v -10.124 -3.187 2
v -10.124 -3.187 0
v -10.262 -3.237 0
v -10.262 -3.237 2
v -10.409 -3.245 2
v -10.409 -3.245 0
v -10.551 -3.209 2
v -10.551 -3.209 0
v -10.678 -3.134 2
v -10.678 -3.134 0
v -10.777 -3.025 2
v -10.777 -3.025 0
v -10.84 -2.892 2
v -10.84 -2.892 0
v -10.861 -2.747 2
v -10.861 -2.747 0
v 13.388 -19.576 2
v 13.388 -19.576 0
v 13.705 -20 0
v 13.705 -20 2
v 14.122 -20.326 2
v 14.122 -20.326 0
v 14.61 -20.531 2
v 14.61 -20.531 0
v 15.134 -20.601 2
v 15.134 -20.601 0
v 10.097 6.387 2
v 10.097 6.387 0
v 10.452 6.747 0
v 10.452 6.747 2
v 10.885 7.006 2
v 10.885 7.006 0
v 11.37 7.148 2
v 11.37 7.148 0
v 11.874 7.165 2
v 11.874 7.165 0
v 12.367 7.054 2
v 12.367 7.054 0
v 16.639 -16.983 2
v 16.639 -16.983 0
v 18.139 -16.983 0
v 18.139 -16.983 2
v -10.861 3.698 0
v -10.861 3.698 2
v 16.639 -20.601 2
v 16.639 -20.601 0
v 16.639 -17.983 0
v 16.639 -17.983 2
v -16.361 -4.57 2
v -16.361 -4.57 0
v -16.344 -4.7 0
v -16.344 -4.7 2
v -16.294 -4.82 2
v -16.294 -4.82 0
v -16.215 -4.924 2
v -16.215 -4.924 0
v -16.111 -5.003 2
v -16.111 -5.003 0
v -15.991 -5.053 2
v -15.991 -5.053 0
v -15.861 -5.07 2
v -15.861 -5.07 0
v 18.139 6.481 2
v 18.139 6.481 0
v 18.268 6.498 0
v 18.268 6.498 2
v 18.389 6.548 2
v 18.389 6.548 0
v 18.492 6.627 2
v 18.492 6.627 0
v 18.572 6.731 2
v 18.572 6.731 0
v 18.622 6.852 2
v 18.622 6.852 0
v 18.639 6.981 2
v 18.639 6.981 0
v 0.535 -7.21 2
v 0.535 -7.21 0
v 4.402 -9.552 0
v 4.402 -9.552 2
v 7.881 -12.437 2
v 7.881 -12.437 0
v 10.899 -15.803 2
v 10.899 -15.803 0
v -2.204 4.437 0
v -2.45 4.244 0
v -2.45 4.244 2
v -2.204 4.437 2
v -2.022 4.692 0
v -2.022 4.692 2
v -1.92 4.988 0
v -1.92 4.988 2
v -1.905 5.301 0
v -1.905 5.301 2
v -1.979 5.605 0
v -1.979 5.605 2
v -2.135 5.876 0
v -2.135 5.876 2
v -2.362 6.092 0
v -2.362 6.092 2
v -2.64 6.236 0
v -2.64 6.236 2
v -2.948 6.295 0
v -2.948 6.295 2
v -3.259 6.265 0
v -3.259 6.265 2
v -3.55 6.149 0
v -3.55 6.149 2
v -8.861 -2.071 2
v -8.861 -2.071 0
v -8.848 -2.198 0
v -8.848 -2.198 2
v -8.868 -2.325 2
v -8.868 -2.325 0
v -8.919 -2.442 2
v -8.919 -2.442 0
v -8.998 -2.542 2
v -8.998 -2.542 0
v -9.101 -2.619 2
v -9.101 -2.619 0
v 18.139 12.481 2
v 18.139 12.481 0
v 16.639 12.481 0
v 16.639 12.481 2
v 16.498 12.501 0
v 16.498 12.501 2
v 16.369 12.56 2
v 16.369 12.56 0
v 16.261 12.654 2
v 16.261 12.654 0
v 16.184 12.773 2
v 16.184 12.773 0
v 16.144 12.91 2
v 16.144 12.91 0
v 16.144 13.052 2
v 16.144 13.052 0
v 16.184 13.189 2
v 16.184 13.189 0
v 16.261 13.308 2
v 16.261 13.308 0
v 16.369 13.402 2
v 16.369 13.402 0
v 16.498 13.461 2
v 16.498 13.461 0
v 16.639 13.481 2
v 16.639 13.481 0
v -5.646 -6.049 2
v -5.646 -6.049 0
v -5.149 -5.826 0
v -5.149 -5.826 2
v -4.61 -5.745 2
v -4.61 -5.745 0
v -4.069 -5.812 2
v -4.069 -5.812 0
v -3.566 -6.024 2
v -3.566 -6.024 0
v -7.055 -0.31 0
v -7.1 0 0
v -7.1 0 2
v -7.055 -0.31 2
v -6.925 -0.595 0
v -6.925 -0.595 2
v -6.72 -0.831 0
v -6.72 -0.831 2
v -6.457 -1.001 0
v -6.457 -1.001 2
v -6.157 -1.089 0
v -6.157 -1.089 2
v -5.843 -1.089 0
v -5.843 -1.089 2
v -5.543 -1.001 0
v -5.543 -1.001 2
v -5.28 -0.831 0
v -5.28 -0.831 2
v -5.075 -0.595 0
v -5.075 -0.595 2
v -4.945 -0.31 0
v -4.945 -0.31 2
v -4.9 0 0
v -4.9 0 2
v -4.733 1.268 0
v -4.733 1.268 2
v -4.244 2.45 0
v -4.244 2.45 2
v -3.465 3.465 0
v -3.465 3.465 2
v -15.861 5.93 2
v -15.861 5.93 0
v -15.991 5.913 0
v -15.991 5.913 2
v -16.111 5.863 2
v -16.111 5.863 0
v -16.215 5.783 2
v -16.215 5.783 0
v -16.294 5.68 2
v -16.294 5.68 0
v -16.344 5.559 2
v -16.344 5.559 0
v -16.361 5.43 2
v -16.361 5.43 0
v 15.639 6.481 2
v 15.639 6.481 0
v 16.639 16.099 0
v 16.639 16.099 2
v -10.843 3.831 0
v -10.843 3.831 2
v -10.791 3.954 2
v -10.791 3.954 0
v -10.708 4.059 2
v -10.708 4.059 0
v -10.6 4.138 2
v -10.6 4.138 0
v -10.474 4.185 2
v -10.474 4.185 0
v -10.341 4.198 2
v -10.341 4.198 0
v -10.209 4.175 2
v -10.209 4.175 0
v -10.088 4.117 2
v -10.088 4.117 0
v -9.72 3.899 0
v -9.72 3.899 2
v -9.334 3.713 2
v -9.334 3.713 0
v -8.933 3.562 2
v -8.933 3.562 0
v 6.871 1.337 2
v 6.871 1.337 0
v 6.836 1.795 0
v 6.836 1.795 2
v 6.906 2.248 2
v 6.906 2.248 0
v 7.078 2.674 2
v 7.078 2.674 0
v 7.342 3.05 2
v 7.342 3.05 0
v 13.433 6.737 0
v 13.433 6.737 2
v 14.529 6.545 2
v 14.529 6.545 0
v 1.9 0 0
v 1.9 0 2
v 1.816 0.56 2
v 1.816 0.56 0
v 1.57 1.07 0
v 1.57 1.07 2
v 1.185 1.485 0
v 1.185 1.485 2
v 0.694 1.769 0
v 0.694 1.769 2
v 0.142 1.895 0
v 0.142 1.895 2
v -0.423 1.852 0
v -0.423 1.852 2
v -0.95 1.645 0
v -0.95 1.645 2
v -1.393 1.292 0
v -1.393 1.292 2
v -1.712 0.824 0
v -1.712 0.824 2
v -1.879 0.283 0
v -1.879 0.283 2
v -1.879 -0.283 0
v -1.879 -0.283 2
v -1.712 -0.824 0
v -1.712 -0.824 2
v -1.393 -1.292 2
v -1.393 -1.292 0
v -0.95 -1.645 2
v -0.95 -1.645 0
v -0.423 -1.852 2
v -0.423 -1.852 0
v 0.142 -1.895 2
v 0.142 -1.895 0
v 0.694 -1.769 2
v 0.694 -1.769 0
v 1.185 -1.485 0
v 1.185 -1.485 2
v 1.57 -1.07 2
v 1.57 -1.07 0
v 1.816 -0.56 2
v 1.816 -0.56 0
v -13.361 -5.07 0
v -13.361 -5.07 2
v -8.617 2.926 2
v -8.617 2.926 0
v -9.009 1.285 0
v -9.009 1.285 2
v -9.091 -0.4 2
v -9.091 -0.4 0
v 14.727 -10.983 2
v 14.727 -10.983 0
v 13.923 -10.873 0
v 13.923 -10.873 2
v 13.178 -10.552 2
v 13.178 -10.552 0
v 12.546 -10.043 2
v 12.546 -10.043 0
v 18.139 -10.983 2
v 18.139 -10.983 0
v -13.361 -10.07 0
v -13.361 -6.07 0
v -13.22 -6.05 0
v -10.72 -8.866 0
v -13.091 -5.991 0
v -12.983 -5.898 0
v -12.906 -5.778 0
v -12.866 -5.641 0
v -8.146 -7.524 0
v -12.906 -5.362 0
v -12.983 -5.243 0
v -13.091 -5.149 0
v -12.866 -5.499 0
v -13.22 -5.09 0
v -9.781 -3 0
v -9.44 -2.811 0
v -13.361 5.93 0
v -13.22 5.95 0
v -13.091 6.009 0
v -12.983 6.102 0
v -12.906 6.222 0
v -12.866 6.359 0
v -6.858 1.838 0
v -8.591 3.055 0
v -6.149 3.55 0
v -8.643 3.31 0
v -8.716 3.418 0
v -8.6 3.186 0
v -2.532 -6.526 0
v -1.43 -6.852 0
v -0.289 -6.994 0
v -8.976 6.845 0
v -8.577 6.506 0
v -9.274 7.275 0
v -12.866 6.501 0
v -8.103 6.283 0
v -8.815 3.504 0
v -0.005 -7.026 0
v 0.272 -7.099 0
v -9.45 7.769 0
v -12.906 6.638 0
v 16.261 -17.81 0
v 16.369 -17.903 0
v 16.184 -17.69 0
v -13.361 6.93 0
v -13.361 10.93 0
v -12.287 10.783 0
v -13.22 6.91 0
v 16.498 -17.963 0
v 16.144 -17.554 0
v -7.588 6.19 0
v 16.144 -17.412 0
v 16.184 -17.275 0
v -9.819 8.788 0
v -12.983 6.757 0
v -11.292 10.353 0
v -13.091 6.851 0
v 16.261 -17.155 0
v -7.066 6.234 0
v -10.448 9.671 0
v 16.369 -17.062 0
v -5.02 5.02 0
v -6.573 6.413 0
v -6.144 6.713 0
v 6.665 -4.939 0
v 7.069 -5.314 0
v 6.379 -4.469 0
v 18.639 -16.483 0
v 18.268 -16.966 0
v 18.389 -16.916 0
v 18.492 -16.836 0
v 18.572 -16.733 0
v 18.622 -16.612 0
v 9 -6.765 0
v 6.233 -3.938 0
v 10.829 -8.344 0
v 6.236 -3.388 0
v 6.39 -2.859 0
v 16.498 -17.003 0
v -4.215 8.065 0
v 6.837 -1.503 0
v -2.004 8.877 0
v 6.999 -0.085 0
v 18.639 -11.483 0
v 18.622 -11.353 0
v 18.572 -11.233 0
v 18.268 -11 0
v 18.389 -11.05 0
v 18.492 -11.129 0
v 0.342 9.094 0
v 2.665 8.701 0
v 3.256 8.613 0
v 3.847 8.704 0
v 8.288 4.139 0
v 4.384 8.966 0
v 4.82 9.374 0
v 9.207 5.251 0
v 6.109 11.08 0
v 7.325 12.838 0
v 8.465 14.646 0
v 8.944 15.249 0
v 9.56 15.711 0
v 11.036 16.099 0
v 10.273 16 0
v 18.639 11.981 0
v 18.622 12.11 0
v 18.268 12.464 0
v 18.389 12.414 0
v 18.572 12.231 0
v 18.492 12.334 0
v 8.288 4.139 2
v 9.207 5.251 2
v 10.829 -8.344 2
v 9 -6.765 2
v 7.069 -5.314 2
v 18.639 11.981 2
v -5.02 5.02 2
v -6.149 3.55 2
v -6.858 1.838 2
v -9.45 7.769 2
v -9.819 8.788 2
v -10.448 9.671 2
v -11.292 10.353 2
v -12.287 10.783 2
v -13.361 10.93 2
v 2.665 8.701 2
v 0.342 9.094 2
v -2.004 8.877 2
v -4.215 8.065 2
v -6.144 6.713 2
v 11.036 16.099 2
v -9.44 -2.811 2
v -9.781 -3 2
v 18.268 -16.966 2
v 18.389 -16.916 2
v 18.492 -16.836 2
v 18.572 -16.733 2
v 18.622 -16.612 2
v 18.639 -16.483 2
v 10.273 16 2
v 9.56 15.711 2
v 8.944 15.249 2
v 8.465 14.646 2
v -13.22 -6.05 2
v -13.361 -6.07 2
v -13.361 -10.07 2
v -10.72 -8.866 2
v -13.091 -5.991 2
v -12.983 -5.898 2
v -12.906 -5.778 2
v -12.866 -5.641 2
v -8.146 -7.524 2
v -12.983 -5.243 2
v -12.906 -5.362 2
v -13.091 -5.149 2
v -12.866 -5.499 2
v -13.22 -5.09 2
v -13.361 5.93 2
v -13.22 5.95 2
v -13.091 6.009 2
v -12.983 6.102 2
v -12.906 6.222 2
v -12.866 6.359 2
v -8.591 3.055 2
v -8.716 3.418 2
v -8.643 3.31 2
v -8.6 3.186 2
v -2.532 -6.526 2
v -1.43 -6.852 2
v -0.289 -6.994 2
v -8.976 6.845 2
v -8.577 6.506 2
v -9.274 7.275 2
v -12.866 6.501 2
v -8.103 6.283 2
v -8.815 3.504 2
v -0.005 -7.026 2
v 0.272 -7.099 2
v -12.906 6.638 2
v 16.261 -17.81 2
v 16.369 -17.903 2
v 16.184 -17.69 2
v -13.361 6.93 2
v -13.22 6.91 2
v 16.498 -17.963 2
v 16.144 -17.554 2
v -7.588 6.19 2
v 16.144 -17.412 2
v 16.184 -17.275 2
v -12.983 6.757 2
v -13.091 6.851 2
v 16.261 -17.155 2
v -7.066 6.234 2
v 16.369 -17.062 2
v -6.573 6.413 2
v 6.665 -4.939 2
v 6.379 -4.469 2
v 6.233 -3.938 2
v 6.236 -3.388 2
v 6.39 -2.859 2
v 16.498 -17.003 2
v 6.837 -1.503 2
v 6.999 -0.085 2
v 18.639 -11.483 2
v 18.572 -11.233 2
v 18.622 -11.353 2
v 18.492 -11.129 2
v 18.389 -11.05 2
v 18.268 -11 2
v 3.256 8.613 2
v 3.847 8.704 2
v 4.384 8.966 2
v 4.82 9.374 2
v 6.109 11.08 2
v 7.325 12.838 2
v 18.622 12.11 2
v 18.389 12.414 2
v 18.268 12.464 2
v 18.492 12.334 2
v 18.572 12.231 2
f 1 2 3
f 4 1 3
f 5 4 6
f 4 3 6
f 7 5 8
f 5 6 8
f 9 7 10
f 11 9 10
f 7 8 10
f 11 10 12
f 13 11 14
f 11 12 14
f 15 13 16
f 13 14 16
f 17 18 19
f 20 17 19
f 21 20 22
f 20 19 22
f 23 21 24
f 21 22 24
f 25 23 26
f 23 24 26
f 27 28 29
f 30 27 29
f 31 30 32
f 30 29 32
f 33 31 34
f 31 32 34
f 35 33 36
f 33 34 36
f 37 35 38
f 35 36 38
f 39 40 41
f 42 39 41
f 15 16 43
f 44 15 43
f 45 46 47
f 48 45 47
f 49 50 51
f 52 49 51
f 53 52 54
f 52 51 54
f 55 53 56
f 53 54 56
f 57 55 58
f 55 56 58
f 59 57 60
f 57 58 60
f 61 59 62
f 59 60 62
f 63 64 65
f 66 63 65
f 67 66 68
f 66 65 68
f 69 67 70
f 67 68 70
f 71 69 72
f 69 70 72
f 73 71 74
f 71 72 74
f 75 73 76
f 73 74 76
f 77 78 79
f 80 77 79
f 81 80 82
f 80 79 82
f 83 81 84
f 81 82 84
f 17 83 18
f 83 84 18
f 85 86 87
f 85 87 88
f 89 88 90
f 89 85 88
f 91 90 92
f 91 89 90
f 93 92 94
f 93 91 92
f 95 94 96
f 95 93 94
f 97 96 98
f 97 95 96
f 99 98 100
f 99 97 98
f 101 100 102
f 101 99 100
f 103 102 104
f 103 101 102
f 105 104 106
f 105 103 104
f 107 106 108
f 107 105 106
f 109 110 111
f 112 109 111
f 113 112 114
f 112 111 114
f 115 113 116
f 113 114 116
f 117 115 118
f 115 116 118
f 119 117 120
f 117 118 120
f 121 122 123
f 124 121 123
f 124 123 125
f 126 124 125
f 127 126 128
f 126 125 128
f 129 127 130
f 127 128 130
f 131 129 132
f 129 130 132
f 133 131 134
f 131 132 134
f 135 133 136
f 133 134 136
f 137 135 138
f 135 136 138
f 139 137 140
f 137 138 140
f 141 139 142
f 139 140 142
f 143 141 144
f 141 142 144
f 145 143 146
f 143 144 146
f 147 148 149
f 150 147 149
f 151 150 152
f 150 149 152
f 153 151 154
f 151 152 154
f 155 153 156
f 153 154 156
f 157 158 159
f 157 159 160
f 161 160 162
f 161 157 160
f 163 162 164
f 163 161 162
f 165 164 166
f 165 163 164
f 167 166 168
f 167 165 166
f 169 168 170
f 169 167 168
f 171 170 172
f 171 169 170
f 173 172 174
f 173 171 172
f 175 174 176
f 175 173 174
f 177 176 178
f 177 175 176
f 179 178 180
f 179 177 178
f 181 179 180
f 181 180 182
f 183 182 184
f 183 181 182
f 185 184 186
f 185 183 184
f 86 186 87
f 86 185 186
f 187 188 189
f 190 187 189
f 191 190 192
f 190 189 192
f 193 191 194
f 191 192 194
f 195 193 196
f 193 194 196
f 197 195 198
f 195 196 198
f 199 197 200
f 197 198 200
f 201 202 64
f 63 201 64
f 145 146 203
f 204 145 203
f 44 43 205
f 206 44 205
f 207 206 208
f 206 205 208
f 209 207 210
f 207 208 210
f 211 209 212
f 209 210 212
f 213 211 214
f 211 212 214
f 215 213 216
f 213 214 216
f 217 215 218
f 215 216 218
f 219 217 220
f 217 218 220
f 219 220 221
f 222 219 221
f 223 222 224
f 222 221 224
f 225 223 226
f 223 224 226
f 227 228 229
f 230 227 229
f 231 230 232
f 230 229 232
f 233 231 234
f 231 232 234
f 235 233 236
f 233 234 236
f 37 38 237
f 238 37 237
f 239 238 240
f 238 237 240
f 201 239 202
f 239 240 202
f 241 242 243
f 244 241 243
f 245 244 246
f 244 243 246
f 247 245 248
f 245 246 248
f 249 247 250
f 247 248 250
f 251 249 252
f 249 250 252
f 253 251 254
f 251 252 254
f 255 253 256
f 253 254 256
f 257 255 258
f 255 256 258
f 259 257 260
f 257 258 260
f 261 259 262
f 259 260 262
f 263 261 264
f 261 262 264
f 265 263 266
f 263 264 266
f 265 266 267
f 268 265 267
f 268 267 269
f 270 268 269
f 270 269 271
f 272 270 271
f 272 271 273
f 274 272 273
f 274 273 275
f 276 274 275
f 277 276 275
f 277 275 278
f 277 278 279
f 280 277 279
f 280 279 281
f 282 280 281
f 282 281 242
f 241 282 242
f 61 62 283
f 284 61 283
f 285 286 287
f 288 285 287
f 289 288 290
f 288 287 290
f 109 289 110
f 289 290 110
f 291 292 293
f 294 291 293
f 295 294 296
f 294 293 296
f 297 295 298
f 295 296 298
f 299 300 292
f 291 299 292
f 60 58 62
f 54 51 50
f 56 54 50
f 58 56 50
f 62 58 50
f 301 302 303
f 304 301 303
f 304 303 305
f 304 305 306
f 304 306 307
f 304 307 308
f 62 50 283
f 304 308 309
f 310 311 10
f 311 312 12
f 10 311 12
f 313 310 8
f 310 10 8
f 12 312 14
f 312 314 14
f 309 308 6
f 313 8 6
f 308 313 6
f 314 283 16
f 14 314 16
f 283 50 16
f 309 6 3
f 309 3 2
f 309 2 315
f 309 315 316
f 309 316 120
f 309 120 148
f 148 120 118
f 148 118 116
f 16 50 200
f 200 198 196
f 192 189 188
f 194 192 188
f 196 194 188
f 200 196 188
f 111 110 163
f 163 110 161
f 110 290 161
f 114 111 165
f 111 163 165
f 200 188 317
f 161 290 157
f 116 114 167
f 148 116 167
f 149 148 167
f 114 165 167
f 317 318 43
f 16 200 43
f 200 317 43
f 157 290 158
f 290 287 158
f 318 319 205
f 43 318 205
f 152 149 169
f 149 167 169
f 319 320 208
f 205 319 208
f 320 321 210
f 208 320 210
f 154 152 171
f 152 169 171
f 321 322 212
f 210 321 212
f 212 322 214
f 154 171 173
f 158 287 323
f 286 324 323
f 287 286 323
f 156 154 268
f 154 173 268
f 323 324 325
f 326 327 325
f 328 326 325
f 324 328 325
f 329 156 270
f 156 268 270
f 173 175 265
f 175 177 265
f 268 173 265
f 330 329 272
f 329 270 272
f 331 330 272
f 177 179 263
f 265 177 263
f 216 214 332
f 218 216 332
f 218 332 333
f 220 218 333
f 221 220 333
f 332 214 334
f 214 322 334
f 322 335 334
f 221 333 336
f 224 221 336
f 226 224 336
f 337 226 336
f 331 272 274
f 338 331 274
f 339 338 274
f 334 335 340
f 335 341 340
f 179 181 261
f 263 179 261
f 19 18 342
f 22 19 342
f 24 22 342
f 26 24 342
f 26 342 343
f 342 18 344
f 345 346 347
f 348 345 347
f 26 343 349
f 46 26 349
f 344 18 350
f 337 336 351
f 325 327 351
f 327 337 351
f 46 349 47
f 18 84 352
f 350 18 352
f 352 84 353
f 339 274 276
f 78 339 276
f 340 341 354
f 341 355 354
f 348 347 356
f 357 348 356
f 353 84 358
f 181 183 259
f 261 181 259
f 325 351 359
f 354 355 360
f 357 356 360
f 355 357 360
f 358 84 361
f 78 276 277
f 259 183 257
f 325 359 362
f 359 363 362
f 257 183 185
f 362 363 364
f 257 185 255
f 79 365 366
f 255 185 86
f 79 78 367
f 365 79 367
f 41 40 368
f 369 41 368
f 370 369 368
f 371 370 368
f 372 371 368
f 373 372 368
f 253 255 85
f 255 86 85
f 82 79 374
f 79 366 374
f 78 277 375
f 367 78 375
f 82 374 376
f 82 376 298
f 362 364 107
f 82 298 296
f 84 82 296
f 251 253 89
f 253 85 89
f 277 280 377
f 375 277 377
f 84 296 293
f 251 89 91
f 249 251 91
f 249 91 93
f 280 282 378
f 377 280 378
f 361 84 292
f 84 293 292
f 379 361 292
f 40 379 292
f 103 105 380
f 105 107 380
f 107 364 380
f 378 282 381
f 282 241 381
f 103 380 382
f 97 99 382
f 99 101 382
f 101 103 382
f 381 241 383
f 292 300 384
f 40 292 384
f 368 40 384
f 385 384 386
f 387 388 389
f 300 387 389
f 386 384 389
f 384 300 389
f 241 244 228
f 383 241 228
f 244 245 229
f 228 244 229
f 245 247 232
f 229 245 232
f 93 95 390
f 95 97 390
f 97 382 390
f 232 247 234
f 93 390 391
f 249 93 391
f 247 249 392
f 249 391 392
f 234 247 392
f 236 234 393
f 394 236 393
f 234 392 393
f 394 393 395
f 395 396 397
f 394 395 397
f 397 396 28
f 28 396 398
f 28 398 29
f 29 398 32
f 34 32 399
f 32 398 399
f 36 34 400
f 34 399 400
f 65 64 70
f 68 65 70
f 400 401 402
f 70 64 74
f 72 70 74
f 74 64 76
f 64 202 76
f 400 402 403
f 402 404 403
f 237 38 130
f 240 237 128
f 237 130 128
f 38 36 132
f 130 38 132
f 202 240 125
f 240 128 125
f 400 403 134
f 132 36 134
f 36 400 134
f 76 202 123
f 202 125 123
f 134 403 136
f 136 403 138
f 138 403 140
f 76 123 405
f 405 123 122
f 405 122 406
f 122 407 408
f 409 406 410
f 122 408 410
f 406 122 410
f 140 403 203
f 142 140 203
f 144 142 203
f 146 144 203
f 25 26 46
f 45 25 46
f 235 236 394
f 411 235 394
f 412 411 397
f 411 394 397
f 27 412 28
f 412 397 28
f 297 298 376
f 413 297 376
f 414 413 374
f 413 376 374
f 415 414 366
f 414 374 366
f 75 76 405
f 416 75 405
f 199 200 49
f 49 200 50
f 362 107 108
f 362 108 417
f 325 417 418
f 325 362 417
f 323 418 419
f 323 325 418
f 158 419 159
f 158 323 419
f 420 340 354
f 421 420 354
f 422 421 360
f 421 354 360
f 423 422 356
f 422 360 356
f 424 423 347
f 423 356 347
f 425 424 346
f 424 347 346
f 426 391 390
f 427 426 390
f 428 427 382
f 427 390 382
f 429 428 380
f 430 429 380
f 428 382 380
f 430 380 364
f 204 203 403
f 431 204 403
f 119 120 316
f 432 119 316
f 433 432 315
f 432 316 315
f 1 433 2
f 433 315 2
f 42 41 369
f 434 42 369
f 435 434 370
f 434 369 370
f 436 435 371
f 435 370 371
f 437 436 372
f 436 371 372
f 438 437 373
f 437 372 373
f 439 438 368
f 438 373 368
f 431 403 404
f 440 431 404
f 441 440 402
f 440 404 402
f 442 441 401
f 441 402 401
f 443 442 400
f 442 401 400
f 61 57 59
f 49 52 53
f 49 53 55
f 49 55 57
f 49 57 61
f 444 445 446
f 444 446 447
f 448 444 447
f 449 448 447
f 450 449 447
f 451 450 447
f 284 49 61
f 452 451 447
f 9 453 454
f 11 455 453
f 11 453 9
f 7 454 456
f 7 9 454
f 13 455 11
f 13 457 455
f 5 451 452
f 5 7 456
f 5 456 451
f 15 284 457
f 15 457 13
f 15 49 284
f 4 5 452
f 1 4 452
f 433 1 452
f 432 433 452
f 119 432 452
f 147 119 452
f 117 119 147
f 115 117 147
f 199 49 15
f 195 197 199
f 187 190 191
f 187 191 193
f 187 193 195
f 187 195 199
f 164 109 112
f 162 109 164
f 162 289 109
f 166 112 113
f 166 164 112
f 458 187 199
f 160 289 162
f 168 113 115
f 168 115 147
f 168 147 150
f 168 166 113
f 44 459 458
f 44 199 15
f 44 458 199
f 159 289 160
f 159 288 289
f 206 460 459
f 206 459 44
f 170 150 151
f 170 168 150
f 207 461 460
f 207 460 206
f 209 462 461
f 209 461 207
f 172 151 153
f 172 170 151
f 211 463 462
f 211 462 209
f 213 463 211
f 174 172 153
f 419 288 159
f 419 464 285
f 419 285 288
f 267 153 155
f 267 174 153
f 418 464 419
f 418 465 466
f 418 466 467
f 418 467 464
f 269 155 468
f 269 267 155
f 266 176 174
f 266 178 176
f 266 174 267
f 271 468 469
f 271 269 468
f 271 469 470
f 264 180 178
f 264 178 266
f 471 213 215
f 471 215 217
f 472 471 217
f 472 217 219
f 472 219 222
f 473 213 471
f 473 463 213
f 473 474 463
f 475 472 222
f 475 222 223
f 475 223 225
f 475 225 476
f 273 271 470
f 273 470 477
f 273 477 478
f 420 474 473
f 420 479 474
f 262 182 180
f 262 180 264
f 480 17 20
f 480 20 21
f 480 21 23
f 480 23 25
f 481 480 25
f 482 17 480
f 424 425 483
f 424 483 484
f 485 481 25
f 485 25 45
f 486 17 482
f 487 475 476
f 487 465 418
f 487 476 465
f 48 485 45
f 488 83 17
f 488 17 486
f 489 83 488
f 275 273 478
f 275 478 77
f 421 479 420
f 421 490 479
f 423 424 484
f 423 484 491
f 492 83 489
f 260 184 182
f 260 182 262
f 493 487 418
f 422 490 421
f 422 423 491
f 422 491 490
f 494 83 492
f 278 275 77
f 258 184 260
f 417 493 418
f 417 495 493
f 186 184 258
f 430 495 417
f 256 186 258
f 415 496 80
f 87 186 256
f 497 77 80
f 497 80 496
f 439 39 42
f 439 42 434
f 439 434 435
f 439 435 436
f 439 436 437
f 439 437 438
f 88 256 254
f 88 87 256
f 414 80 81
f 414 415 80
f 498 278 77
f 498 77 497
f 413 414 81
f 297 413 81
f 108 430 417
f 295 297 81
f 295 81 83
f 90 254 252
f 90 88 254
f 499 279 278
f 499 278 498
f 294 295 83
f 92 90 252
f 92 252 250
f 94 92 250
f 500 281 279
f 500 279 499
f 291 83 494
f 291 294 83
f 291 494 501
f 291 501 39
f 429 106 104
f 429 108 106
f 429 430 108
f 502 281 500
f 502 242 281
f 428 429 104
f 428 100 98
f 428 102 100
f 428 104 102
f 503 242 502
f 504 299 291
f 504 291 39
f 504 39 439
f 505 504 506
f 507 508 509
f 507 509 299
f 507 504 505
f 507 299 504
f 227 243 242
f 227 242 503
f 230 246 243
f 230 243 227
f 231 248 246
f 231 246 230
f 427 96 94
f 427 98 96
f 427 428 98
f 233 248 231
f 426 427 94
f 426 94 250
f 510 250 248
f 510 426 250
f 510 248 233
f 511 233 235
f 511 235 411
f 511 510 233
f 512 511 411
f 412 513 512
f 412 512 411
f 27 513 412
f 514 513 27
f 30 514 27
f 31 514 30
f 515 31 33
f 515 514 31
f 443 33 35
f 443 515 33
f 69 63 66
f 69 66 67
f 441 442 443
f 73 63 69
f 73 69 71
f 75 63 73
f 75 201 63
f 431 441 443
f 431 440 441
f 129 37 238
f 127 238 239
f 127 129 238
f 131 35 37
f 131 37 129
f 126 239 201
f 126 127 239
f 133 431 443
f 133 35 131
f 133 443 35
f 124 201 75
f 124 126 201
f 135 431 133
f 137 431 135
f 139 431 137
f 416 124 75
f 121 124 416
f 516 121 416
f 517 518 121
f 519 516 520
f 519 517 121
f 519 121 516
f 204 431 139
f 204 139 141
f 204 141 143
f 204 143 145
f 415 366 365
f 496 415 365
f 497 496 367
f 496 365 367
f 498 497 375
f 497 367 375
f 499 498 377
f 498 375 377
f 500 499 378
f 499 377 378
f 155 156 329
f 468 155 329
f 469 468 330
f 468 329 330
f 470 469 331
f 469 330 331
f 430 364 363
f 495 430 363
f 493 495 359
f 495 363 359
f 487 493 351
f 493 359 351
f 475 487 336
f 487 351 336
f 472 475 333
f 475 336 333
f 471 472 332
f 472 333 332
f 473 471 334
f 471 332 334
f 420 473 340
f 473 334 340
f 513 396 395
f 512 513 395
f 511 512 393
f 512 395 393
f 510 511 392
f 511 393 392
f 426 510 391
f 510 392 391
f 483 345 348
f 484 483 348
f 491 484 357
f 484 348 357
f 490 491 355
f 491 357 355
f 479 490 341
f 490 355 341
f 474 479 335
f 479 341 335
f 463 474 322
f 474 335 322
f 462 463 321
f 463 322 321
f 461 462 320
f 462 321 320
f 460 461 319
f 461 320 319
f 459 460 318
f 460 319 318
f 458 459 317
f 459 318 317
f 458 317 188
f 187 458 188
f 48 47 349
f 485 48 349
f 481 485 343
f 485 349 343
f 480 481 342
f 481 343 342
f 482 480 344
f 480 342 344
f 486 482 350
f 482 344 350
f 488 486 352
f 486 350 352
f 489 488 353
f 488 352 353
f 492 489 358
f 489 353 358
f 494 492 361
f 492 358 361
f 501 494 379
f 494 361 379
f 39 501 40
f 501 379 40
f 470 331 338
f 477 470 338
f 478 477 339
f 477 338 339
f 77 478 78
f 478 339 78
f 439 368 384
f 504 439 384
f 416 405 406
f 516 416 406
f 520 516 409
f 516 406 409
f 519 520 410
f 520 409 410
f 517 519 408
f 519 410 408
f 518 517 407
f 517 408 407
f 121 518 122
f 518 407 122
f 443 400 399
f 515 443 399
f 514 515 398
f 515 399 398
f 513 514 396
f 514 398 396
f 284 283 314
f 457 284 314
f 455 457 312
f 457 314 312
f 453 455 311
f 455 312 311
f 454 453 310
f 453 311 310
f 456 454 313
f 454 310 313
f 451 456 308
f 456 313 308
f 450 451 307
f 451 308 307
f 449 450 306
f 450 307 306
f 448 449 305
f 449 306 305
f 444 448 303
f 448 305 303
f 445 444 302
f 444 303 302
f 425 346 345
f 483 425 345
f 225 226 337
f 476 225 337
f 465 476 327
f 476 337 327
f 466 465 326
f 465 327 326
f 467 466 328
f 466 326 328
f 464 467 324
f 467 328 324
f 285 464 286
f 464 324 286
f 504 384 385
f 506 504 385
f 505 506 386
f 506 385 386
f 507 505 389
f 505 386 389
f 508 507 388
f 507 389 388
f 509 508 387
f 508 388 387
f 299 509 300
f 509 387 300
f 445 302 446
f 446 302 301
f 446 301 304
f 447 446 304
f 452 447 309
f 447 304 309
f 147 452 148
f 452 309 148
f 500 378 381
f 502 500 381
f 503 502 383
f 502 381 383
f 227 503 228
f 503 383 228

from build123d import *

# Parameters (mm, degrees)
BOSS_EXTRUDE1_DEPTH        = 2
M3_5_CLEARANCE_HOLE1_D     = 3.8
M3_5_CLEARANCE_HOLE1_DEPTH = 2


with BuildPart() as part:
    # Sketch1 → Boss-Extrude1 (new body)
    with BuildSketch(Plane.XY):
        with BuildLine():
            Line((18.63883017, -16.482761143), (18.63883017, -11.482761143))
            ThreePointArc((18.63883017, -11.482761143), (18.492383561, -11.129207753), (18.13883017, -10.982761143))
            Line((18.13883017, -10.982761143), (14.726824149, -10.982761143))
            ThreePointArc((14.726824149, -10.982761143), (13.539431255, -10.737774413), (12.545968697, -10.042826553))
            ThreePointArc((12.545968697, -10.042826553), (9.927684451, -7.539157578), (7.068753945, -5.314233513))
            ThreePointArc((7.068753945, -5.314233513), (6.287636427, -4.208593434), (6.389660154, -2.858713543))
            ThreePointArc((6.389660154, -2.858713543), (6.954343162, -0.798192452), (6.871191626, 1.336684568))
            ThreePointArc((6.871191626, 1.336684568), (6.905834234, 2.248382718), (7.341806065, 3.049832772))
            ThreePointArc((7.341806065, 3.049832772), (8.751272055, 4.692211544), (10.096999644, 6.387209969))
            ThreePointArc((10.096999644, 6.387209969), (11.122804542, 7.092577212), (12.367138803, 7.054486744))
            ThreePointArc((12.367138803, 7.054486744), (13.978037739, 6.625408008), (15.63883017, 6.480935011))
            Line((15.63883017, 6.480935011), (18.13883017, 6.480935011))
            ThreePointArc((18.13883017, 6.480935011), (18.492383561, 6.62738162), (18.63883017, 6.980935011))
            Line((18.63883017, 6.980935011), (18.63883017, 11.980935011))
            ThreePointArc((18.63883017, 11.980935011), (18.492383561, 12.334488401), (18.13883017, 12.480935011))
            Line((18.13883017, 12.480935011), (16.63883017, 12.480935011))
            ThreePointArc((16.63883017, 12.480935011), (16.13883017, 12.980935011), (16.63883017, 13.480935011))
            Line((16.63883017, 13.480935011), (16.63883017, 16.099008984))
            Line((16.63883017, 16.099008984), (11.035994897, 16.099008984))
            ThreePointArc((11.035994897, 16.099008984), (9.559562701, 15.710550285), (8.465485791, 14.645774297))
            ThreePointArc((8.465485791, 14.645774297), (6.726327278, 11.952270464), (4.820305649, 9.37414774))
            ThreePointArc((4.820305649, 9.37414774), (3.846646619, 8.704308056), (2.664831641, 8.701073056))
            ThreePointArc((2.664831641, 8.701073056), (-2.003730385, 8.876658411), (-6.144167501, 6.712615415))
            ThreePointArc((-6.144167501, 6.712615415), (-8.103077659, 6.282745016), (-9.450079267, 7.768579541))
            ThreePointArc((-9.450079267, 7.768579541), (-10.84668059, 10.040750561), (-13.36116983, 10.92990761))
            Line((-13.36116983, 10.92990761), (-13.36116983, 6.92990761))
            ThreePointArc((-13.36116983, 6.92990761), (-12.86116983, 6.42990761), (-13.36116983, 5.92990761))
            Line((-13.36116983, 5.92990761), (-15.86116983, 5.92990761))
            ThreePointArc((-15.86116983, 5.92990761), (-16.21472322, 5.783461001), (-16.36116983, 5.42990761))
            Line((-16.36116983, 5.42990761), (-16.36116983, -4.57009239))
            ThreePointArc((-16.36116983, -4.57009239), (-16.21472322, -4.92364578), (-15.86116983, -5.07009239))
            Line((-15.86116983, -5.07009239), (-13.36116983, -5.07009239))
            ThreePointArc((-13.36116983, -5.07009239), (-12.86116983, -5.57009239), (-13.36116983, -6.07009239))
            Line((-13.36116983, -6.07009239), (-13.36116983, -10.07009239))
            ThreePointArc((-13.36116983, -10.07009239), (-9.424252929, -8.211858727), (-5.645907876, -6.049347295))
            ThreePointArc((-5.645907876, -6.049347295), (-4.609540233, -5.744803026), (-3.565955999, -6.023616672))
            ThreePointArc((-3.565955999, -6.023616672), (-1.987644312, -6.711875303), (-0.289069284, -6.994028807))
            ThreePointArc((-0.289069284, -6.994028807), (0.134843139, -7.057521972), (0.535490188, -7.209886886))
            ThreePointArc((0.535490188, -7.209886886), (7.881477412, -12.437026609), (13.387941825, -19.576029874))
            ThreePointArc((13.387941825, -19.576029874), (14.121752395, -20.325710404), (15.134079043, -20.600835116))
            Line((15.134079043, -20.600835116), (16.63883017, -20.600835116))
            Line((16.63883017, -20.600835116), (16.63883017, -17.982761143))
            ThreePointArc((16.63883017, -17.982761143), (16.13883017, -17.482761143), (16.63883017, -16.982761143))
            Line((16.63883017, -16.982761143), (18.13883017, -16.982761143))
            ThreePointArc((18.13883017, -16.982761143), (18.492383561, -16.836314534), (18.63883017, -16.482761143))
        make_face()
        with BuildLine():
            Line((-10.86116983, -2.746889398), (-10.86116983, 3.698246713))
            ThreePointArc((-10.86116983, 3.698246713), (-10.599535477, 4.13777125), (-10.088442557, 4.117316916))
            ThreePointArc((-10.088442557, 4.117316916), (-9.528608488, 3.802221602), (-8.932994407, 3.561507855))
            ThreePointArc((-8.932994407, 3.561507855), (-8.642555945, 3.309647034), (-8.616730153, 2.926082957))
            ThreePointArc((-8.616730153, 2.926082957), (-9.089130193, 0.444648546), (-8.861194309, -2.071046938))
            ThreePointArc((-8.861194309, -2.071046938), (-8.88986137, -2.384945686), (-9.100629521, -2.619319341))
            ThreePointArc((-9.100629521, -2.619319341), (-9.610484862, -2.905923033), (-10.123517324, -3.186799942))
            ThreePointArc((-10.123517324, -3.186799942), (-10.617269173, -3.176322893), (-10.86116983, -2.746889398))
        make_face(mode=Mode.SUBTRACT)
        with BuildLine():
            ThreePointArc((-3.55, 6.148780367), (-6.148780367, 3.55), (-7.1, 0))
            ThreePointArc((-7.1, 0), (-6, -1.1), (-4.9, 0))
            ThreePointArc((-4.9, 0), (-4.243524479, 2.45), (-2.45, 4.243524479))
            ThreePointArc((-2.45, 4.243524479), (-2.047372056, 5.746152423), (-3.55, 6.148780367))
        make_face(mode=Mode.SUBTRACT)
    extrude(amount=BOSS_EXTRUDE1_DEPTH)

    # M3.5 Clearance Hole1
    with Locations(Plane(origin=(0, 0, 0), x_dir=(-1, 0, 0), z_dir=(0, 0, -1))):
        with Locations((0, 0)):
            Hole(M3_5_CLEARANCE_HOLE1_D / 2, depth=M3_5_CLEARANCE_HOLE1_DEPTH)


solid = part.part
